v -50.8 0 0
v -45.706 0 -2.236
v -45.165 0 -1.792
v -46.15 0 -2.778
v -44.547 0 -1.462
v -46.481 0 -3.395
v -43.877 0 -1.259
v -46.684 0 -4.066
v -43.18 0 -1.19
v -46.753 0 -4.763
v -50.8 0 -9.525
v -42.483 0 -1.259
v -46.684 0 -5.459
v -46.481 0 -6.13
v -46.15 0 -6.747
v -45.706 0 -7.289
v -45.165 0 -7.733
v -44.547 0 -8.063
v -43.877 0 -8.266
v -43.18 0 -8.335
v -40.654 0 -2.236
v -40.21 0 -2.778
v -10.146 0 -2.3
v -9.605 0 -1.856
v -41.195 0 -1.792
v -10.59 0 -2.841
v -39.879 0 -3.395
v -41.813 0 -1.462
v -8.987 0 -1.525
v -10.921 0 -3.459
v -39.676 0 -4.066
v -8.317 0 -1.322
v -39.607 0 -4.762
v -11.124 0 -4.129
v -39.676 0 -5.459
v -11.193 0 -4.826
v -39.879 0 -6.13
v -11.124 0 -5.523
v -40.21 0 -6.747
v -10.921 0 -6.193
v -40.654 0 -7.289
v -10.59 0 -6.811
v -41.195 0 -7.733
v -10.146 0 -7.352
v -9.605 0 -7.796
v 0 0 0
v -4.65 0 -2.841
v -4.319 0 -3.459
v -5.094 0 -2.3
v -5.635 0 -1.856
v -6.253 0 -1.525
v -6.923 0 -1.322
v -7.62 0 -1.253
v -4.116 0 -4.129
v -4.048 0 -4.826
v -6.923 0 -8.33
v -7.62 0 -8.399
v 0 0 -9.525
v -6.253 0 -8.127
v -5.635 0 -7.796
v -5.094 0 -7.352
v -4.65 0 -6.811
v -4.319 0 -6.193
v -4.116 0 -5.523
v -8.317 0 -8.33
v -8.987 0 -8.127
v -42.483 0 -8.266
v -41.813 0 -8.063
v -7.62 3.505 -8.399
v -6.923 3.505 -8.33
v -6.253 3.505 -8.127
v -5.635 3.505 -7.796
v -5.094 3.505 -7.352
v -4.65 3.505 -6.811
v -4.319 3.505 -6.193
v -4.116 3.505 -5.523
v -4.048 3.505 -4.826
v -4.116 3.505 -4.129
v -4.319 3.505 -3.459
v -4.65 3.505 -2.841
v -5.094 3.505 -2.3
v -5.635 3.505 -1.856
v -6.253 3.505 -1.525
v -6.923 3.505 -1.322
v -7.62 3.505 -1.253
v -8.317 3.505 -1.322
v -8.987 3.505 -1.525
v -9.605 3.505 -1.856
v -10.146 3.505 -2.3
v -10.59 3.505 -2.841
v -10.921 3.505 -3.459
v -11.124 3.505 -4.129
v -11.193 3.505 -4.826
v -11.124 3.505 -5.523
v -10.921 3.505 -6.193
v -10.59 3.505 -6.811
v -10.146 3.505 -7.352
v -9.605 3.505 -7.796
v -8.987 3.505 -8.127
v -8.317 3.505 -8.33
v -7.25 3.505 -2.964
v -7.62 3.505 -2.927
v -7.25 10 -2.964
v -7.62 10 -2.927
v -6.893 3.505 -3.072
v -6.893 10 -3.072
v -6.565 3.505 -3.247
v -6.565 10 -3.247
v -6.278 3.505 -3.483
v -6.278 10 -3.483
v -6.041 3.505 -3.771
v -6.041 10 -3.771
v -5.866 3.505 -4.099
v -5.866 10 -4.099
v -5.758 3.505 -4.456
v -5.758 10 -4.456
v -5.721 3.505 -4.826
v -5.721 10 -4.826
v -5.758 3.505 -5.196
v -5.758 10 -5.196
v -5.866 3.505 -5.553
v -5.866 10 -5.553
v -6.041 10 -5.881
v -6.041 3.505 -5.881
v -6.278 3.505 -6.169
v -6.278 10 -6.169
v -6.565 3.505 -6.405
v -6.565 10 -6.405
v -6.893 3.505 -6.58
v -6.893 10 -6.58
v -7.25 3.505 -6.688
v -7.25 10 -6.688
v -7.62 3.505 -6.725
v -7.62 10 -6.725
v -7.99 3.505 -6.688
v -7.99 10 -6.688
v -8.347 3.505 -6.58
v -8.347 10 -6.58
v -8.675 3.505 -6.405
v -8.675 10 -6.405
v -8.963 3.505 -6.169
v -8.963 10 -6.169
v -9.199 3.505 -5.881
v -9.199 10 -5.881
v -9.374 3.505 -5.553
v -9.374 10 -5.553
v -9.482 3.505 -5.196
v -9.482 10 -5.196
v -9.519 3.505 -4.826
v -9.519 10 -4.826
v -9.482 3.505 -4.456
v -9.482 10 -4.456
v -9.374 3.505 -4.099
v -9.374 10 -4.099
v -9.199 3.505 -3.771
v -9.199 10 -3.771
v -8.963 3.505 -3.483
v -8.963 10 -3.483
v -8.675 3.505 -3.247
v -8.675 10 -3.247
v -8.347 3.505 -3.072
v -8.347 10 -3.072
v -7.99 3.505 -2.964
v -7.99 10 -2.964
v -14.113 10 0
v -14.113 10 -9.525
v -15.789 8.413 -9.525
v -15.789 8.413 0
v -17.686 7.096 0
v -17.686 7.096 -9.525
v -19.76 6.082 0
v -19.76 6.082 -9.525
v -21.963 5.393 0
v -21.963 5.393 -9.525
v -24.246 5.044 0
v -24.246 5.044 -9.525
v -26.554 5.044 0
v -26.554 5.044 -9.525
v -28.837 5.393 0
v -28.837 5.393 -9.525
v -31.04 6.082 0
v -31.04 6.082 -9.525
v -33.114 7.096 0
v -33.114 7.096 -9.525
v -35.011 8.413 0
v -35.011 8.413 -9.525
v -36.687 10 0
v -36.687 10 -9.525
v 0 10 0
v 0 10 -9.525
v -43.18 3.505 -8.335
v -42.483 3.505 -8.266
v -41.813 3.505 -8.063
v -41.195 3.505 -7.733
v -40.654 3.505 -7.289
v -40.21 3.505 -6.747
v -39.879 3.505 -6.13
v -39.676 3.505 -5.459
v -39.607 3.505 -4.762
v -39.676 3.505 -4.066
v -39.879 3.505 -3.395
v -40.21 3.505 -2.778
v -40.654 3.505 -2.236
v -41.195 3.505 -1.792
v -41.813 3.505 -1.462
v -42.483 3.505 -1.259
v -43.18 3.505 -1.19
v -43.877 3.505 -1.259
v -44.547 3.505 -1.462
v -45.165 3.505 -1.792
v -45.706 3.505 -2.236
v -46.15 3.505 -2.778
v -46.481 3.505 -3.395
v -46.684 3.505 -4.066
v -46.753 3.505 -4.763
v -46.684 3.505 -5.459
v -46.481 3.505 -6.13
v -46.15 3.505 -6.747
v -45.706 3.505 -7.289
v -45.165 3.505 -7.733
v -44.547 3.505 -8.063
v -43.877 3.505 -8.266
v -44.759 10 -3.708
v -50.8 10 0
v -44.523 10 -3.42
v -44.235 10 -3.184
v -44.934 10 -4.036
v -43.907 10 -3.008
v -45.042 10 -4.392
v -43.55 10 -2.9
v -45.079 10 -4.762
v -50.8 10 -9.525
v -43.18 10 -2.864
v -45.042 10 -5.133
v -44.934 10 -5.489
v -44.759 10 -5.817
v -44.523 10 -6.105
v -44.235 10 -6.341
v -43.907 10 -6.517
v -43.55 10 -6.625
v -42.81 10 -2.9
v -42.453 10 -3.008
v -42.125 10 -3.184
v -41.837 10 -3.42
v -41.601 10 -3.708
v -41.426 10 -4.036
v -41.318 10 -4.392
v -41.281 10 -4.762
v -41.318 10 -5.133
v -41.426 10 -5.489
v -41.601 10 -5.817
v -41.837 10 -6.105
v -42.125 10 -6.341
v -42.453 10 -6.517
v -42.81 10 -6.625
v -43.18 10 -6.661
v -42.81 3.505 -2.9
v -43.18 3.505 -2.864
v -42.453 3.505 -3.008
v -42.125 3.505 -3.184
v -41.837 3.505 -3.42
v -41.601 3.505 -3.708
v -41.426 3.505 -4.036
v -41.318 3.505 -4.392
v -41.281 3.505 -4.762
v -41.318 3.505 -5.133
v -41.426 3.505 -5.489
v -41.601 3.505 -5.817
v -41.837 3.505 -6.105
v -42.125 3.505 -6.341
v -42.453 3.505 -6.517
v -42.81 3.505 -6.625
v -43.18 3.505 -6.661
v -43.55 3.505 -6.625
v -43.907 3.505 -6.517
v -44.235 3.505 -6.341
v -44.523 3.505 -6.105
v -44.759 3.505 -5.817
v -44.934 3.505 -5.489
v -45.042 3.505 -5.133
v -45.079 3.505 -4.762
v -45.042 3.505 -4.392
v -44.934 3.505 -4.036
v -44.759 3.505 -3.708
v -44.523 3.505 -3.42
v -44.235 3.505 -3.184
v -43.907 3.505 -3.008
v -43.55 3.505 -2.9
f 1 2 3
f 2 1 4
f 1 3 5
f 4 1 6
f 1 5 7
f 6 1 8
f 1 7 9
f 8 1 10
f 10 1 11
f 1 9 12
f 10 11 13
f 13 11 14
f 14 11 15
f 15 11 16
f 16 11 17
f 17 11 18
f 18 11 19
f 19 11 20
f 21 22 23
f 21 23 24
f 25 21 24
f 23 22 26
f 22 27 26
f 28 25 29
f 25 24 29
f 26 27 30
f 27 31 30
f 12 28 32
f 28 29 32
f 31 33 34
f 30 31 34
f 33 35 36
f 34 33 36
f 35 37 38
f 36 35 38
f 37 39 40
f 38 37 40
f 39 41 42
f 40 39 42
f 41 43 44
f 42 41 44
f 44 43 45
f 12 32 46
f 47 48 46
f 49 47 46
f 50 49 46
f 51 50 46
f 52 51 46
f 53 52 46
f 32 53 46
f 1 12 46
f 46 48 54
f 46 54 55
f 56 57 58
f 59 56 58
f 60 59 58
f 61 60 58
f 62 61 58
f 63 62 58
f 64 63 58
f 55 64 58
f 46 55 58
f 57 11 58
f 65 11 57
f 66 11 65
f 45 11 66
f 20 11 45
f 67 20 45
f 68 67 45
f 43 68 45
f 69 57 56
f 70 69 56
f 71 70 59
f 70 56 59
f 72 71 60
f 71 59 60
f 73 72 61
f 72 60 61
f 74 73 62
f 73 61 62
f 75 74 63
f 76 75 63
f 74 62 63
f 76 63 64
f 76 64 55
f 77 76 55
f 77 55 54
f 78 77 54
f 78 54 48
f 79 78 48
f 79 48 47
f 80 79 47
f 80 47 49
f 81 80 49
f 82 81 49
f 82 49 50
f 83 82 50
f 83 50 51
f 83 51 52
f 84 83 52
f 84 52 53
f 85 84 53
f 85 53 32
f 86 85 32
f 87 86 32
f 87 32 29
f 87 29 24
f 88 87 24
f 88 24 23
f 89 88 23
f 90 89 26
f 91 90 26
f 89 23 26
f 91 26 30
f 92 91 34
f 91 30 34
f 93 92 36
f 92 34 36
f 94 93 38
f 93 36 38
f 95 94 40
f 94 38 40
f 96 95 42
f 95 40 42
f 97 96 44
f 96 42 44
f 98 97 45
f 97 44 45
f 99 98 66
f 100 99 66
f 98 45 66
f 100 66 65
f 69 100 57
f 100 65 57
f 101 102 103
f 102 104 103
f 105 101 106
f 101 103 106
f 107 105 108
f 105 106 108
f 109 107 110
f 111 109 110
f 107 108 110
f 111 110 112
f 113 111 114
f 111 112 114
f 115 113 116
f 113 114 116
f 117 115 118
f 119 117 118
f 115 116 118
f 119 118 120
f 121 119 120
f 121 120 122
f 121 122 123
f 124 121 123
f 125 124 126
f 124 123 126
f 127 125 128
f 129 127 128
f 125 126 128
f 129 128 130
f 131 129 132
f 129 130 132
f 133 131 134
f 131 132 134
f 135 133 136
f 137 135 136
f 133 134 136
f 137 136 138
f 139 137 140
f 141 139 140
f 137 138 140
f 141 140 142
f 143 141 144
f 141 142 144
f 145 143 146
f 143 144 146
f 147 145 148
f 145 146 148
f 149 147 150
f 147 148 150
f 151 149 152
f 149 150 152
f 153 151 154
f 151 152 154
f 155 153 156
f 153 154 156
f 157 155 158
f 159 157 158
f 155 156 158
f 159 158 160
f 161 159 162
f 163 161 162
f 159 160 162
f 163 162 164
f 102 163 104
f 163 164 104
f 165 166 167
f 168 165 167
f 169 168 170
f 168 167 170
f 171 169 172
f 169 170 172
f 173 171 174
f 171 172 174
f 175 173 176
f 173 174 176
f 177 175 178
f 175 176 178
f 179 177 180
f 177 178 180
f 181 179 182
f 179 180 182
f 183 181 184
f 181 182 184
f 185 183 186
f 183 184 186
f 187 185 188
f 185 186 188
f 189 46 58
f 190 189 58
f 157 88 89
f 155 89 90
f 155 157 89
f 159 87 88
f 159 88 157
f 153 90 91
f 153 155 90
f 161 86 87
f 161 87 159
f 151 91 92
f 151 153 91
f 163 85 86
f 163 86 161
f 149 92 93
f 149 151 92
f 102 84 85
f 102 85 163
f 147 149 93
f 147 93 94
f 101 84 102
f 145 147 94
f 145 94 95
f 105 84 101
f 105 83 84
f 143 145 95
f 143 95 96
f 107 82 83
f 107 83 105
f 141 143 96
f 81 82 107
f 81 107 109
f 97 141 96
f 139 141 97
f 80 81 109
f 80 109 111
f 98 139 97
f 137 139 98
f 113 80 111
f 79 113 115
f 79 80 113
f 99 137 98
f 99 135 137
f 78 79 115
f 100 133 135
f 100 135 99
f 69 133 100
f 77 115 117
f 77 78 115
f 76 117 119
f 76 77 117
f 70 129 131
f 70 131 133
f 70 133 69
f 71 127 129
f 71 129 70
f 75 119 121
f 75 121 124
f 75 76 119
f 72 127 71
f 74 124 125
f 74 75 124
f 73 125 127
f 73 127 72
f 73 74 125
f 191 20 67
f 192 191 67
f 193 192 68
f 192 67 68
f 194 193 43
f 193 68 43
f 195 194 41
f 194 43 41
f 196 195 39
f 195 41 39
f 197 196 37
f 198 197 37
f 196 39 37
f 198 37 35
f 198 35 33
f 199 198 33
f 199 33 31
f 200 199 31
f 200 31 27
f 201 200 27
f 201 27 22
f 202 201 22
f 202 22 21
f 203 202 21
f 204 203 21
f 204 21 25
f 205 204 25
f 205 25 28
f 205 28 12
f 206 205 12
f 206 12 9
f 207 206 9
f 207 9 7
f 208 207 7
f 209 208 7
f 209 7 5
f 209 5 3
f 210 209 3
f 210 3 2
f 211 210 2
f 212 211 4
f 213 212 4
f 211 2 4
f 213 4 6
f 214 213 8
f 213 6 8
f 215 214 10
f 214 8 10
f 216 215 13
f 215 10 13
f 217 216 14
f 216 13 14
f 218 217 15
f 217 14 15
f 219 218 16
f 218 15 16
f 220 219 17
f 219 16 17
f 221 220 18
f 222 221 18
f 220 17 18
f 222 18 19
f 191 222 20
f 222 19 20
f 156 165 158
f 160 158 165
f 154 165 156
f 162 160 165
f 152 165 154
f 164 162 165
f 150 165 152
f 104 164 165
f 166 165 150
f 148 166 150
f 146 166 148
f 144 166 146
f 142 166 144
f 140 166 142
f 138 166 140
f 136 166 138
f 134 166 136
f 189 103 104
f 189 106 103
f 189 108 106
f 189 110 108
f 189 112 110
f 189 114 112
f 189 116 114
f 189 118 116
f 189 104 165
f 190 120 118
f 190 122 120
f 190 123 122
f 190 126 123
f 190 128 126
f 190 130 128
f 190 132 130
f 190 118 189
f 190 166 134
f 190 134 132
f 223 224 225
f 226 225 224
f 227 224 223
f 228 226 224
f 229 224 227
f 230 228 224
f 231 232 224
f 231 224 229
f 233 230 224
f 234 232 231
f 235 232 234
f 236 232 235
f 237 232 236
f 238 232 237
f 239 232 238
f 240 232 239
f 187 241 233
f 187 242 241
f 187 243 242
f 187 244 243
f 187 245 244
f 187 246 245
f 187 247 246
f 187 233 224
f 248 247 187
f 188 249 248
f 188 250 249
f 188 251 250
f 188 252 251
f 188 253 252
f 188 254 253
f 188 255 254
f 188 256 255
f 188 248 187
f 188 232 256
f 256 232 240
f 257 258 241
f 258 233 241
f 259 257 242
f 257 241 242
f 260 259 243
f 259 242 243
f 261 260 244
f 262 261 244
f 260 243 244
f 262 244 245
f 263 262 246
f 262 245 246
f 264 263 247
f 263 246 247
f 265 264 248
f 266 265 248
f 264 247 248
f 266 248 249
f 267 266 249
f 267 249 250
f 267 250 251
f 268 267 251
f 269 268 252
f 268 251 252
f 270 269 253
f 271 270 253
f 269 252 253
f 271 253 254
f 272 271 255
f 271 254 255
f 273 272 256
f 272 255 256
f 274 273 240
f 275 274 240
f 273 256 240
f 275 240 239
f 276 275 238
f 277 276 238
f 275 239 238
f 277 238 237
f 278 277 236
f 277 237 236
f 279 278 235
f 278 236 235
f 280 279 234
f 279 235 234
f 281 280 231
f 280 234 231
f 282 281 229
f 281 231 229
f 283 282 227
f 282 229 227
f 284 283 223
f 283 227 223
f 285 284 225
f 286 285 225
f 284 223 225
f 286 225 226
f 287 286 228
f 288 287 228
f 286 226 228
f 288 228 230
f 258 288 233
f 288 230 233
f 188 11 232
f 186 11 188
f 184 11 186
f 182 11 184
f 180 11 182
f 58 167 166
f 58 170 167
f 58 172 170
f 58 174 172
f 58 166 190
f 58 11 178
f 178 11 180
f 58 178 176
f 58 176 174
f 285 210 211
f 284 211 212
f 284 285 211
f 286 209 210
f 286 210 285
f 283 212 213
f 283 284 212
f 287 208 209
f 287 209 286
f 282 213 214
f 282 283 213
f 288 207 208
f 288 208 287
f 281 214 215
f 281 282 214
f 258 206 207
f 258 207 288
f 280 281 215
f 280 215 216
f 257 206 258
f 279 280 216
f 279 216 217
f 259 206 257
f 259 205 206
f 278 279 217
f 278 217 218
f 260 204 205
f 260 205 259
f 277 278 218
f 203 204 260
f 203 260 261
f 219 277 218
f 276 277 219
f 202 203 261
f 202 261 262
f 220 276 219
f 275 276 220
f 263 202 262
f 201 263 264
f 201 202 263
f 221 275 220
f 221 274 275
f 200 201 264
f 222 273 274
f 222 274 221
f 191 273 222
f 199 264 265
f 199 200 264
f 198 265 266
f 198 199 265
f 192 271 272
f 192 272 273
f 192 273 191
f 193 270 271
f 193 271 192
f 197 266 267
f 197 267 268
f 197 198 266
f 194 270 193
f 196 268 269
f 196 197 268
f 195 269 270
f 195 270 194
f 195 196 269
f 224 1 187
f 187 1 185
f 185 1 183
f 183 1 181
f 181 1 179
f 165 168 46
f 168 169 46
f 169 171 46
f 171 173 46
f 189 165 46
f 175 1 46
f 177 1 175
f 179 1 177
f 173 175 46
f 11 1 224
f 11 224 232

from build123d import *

# Parameters (mm, degrees)
SKETCH1_W                                      = 50.8
SKETCH1_H                                      = 9.525
EXTRUDE1_DEPTH                                 = 10
SKETCH2_R                                      = 15.24
CUT_EXTRUDE1_DEPTH                             = 10.525
CBORE_FOR_6_SOCKET_HEAD_CAP_SCREW1_D           = 3.7973
CBORE_FOR_6_SOCKET_HEAD_CAP_SCREW1_CBORE_D     = 7.14502
CBORE_FOR_6_SOCKET_HEAD_CAP_SCREW1_CBORE_DEPTH = 3.5052


with BuildPart() as part:
    # Sketch1 → Extrude1 (new body)
    with BuildSketch(Plane(origin=(0, 0, 0), x_dir=(1, 0, 0), z_dir=(0, 1, 0))):
        with Locations((-25.4, 4.7625)):
            Rectangle(SKETCH1_W, SKETCH1_H)
    extrude(amount=EXTRUDE1_DEPTH)

    # Sketch2 → Cut-Extrude1 (cut, through all)
    with BuildSketch(Plane(origin=(0, 0, -9.525), x_dir=(-1, 0, 0), z_dir=(0, 0, -1))):
        with Locations((25.4, 20.24)):
            Circle(SKETCH2_R)
    extrude(amount=-CUT_EXTRUDE1_DEPTH, mode=Mode.SUBTRACT)

    # CBORE for #6 Socket Head Cap Screw1 (through all)
    with Locations(Plane(origin=(-43.18, 0, -4.7625), x_dir=(0, 0, -1), z_dir=(0, -1, 0))):
        with Locations((0, 0), (0.0635, 35.559943304)):
            CounterBoreHole(CBORE_FOR_6_SOCKET_HEAD_CAP_SCREW1_D / 2, CBORE_FOR_6_SOCKET_HEAD_CAP_SCREW1_CBORE_D / 2, CBORE_FOR_6_SOCKET_HEAD_CAP_SCREW1_CBORE_DEPTH)


solid = part.part
